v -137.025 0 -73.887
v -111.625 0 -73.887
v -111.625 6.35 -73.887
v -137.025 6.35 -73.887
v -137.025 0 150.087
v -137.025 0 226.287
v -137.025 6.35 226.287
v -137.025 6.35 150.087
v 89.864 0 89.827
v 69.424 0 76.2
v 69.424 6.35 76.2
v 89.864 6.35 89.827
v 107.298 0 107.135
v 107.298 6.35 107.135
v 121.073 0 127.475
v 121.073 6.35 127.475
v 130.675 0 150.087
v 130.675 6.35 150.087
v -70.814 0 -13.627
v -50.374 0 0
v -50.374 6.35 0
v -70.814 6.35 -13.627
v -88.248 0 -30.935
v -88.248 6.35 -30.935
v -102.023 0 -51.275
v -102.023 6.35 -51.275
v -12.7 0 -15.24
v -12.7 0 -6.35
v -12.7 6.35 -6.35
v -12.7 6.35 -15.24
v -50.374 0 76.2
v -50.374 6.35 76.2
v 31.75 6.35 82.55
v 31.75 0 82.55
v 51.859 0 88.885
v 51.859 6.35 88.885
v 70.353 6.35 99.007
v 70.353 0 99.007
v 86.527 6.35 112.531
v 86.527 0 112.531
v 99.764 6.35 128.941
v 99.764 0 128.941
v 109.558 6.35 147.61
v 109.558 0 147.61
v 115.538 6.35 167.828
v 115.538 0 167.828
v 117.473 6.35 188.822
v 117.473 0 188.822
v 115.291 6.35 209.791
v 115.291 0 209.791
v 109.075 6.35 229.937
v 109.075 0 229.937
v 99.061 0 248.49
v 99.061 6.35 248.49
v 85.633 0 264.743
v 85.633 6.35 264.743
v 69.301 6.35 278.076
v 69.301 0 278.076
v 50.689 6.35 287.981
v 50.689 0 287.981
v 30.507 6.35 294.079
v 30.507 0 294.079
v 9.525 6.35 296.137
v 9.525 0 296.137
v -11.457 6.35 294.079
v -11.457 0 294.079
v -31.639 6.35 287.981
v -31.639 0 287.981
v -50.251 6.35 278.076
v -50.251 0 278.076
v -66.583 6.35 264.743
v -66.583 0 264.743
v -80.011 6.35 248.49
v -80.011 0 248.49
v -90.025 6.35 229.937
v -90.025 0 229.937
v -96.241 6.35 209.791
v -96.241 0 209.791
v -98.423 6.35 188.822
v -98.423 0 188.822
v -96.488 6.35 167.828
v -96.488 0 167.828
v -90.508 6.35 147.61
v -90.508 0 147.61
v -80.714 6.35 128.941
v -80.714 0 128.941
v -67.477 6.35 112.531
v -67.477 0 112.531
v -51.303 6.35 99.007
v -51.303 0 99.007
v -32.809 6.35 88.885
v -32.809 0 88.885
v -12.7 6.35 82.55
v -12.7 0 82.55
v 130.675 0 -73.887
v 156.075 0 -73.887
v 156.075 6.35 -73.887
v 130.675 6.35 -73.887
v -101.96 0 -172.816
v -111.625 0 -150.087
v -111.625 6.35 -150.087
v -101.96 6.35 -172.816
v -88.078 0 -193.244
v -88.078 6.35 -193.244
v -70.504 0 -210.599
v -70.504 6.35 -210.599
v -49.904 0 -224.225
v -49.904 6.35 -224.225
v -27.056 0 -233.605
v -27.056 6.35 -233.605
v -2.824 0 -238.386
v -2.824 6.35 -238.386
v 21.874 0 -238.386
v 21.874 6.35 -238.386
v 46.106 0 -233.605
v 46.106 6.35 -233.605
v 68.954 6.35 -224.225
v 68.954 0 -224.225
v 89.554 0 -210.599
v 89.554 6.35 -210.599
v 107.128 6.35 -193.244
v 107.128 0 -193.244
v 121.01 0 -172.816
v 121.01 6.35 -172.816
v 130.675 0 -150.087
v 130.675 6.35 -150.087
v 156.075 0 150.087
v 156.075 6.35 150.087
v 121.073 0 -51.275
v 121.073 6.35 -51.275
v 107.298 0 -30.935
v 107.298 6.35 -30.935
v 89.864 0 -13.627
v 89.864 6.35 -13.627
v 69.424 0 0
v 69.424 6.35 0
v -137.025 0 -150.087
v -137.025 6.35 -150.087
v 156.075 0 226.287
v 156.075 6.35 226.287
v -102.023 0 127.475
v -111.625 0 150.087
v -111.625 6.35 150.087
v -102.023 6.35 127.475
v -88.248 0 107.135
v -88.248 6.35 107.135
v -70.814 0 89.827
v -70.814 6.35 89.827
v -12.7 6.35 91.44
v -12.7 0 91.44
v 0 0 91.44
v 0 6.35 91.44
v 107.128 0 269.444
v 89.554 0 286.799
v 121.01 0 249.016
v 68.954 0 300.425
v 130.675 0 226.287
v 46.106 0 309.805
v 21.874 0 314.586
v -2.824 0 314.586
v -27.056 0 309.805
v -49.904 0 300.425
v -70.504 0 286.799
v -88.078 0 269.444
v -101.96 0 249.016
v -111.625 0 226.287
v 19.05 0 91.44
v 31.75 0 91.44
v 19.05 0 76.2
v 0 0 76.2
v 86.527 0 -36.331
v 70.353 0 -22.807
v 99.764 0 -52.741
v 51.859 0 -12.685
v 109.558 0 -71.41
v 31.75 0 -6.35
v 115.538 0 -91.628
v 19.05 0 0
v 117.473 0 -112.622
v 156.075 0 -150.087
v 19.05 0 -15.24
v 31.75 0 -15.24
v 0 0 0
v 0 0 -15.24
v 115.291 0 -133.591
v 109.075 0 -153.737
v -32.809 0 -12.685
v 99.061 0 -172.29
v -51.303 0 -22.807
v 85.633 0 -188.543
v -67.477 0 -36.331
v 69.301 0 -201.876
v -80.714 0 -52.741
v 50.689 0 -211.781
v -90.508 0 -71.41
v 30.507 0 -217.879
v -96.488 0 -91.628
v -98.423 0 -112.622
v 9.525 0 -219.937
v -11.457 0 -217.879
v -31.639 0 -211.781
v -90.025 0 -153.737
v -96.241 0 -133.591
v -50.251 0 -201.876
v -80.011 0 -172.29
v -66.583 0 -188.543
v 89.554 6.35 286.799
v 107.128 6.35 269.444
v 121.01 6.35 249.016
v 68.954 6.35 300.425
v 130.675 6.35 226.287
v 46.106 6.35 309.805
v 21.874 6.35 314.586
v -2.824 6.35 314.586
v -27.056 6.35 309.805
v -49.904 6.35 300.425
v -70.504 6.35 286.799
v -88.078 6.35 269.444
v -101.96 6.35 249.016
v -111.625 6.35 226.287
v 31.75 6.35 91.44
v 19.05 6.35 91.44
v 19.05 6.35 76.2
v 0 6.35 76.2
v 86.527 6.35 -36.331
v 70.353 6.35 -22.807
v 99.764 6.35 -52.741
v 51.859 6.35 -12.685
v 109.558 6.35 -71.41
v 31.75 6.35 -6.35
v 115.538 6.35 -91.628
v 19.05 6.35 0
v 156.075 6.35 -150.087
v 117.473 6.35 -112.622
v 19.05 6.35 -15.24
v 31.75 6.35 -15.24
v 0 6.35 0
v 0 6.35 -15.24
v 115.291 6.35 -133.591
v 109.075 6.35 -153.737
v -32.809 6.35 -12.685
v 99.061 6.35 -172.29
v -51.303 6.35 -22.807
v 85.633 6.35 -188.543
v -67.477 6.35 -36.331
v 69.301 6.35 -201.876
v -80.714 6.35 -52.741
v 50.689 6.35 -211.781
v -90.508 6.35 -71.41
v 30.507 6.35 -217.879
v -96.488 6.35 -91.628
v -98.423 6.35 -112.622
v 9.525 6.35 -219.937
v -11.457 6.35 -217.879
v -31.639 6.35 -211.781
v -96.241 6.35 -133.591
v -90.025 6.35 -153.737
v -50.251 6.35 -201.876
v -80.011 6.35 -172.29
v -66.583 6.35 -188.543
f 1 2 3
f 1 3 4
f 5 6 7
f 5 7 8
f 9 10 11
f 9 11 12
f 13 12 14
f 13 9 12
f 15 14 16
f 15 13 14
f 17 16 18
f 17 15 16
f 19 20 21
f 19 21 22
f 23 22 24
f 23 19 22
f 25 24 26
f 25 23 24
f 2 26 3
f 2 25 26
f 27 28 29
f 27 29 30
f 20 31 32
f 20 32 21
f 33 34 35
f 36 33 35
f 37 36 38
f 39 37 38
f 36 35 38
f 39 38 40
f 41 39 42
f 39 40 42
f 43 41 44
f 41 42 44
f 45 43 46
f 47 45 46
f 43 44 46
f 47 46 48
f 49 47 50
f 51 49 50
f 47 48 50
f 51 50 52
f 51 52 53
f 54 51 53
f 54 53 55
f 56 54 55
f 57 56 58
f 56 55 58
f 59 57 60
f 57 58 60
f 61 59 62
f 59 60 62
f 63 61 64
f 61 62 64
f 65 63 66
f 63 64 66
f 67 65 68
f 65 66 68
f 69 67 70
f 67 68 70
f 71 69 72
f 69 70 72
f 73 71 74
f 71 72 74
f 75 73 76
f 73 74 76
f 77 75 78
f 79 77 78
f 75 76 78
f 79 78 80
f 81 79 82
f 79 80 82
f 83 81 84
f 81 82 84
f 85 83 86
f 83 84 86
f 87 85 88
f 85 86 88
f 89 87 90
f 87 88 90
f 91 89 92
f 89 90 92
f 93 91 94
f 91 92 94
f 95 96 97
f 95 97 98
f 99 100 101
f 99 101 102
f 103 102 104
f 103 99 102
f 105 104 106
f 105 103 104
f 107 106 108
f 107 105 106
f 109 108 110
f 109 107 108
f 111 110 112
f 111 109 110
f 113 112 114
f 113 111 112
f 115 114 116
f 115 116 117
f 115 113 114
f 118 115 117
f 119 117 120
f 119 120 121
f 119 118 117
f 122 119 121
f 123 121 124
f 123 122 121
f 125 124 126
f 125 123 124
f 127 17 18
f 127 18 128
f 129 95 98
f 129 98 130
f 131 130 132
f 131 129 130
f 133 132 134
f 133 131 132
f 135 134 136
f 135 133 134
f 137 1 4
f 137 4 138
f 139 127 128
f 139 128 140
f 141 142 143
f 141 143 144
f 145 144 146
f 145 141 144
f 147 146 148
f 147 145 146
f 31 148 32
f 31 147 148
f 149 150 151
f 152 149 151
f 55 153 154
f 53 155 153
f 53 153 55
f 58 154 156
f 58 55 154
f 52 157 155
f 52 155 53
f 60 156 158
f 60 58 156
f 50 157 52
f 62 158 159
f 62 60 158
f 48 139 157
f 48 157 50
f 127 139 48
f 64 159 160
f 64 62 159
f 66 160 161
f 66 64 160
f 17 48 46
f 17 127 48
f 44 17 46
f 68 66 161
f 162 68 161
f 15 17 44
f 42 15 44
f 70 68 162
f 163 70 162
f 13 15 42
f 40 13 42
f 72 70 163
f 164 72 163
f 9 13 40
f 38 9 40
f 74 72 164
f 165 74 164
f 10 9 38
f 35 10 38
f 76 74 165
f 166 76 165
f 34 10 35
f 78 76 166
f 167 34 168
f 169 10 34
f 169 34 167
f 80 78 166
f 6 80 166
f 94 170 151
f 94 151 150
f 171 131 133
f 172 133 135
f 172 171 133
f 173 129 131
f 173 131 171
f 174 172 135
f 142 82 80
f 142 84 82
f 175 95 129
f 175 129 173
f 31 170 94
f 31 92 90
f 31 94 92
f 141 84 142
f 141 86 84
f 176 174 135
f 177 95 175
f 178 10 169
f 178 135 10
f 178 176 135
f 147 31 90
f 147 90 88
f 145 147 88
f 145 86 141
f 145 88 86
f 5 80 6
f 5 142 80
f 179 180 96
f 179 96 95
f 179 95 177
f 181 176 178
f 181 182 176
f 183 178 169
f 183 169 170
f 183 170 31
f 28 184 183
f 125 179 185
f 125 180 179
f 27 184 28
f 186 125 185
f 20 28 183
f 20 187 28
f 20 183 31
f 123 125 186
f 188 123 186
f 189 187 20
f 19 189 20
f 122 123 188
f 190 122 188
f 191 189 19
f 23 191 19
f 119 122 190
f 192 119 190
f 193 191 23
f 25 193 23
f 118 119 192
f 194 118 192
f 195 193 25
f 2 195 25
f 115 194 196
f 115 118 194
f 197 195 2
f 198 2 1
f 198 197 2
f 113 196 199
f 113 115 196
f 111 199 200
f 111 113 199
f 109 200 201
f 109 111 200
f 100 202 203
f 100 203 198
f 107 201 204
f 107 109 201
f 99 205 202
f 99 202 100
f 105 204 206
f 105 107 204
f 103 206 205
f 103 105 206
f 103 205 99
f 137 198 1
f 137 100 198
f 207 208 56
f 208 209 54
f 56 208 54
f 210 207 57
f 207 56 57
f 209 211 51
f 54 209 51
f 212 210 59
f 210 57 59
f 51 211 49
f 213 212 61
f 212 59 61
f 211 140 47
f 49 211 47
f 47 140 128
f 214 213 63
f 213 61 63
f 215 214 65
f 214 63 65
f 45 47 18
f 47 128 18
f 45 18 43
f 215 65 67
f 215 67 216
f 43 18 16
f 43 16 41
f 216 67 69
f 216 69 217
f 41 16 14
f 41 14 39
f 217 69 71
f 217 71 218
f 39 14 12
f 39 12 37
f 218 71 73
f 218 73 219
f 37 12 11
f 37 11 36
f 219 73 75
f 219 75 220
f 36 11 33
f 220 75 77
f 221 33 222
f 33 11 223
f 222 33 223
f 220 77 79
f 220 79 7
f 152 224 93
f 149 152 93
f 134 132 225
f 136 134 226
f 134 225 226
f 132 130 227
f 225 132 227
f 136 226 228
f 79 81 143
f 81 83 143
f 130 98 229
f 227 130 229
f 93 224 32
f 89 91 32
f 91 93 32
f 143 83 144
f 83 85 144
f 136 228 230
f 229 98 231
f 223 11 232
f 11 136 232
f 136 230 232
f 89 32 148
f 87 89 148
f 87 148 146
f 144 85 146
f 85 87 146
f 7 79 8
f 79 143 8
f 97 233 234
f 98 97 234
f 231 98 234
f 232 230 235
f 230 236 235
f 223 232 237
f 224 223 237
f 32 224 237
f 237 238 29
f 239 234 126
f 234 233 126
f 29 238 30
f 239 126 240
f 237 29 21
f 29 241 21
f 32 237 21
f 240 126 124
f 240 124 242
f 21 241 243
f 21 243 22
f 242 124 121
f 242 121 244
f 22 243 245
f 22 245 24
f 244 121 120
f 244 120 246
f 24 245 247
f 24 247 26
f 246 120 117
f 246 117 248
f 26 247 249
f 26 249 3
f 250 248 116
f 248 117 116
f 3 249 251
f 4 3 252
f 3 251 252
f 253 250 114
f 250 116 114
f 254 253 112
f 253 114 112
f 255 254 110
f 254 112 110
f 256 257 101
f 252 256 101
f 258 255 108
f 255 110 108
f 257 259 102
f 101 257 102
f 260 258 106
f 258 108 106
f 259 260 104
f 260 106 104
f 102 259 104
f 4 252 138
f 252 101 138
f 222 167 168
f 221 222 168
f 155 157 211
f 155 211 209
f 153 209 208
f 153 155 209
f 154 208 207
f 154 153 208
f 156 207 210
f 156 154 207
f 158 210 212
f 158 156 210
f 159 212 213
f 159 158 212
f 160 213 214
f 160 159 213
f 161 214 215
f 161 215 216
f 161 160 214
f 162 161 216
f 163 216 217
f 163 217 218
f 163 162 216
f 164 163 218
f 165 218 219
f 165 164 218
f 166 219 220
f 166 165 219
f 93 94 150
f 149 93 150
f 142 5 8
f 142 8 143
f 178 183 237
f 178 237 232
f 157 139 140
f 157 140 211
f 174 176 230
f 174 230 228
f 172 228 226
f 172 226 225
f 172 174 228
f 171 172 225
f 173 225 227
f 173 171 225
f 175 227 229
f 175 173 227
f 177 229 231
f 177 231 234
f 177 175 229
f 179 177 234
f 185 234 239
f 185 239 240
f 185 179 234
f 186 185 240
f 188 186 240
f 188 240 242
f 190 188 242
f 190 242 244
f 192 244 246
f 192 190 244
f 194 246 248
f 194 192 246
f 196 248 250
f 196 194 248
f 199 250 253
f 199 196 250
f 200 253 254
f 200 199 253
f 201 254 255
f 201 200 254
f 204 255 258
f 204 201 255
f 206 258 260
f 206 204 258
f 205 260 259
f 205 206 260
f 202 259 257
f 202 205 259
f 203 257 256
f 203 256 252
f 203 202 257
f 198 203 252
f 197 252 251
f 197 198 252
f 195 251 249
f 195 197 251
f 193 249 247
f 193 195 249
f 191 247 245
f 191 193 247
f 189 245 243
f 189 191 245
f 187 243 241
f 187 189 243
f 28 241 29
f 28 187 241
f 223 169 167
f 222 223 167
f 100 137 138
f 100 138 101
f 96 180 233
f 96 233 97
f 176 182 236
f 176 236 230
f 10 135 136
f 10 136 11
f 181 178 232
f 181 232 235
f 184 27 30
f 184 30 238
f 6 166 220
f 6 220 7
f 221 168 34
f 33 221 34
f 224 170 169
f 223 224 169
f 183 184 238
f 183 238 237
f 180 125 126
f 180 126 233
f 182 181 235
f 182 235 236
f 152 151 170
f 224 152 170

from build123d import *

# Parameters (mm, degrees)
BOSS_EXTRUDE1_DEPTH = 6.35


with BuildPart() as part:
    # Sketch1 → Boss-Extrude1 (new body)
    with BuildSketch(Plane(origin=(0, 0, 0), x_dir=(1, 0, 0), z_dir=(0, 1, 0))):
        with BuildLine():
            Line((130.67527858, 150.087360224), (156.07527858, 150.087360224))
            Line((156.07527858, 150.087360224), (156.07527858, 73.887360224))
            Line((156.07527858, 73.887360224), (130.67527858, 73.887360224))
            ThreePointArc((130.67527858, 73.887360224), (107.297701698, 30.934915456), (69.423507078, 0))
            Line((69.423507078, 0), (69.423507078, -76.2))
            ThreePointArc((69.423507078, -76.2), (107.297701698, -107.134915456), (130.67527858, -150.087360224))
            Line((130.67527858, -150.087360224), (156.07527858, -150.087360224))
            Line((156.07527858, -150.087360224), (156.07527858, -226.287360224))
            Line((156.07527858, -226.287360224), (130.67527858, -226.287360224))
            ThreePointArc((130.67527858, -226.287360224), (9.525, -315.187360224), (-111.62527858, -226.287360224))
            Line((-111.62527858, -226.287360224), (-137.02527858, -226.287360224))
            Line((-137.02527858, -226.287360224), (-137.02527858, -150.087360224))
            Line((-137.02527858, -150.087360224), (-111.62527858, -150.087360224))
            ThreePointArc((-111.62527858, -150.087360224), (-88.247701698, -107.134915456), (-50.373507078, -76.2))
            Line((-50.373507078, -76.2), (-50.373507078, 0))
            ThreePointArc((-50.373507078, 0), (-88.247701698, 30.934915456), (-111.62527858, 73.887360224))
            Line((-111.62527858, 73.887360224), (-137.02527858, 73.887360224))
            Line((-137.02527858, 73.887360224), (-137.02527858, 150.087360224))
            Line((-137.02527858, 150.087360224), (-111.62527858, 150.087360224))
            ThreePointArc((-111.62527858, 150.087360224), (9.525, 238.987360224), (130.67527858, 150.087360224))
        make_face()
        with BuildLine():
            Line((0, 0), (19.05, 0))
            Line((19.05, 0), (19.05, 15.24))
            Line((19.05, 15.24), (31.75, 15.24))
            Line((31.75, 15.24), (31.75, 6.35))
            ThreePointArc((31.75, 6.35), (9.525, 219.937360224), (-12.7, 6.35))
            Line((-12.7, 6.35), (-12.7, 15.24))
            Line((-12.7, 15.24), (0, 15.24))
            Line((0, 15.24), (0, 0))
        make_face(mode=Mode.SUBTRACT)
        with BuildLine():
            Line((0, -76.2), (19.05, -76.2))
            Line((19.05, -76.2), (19.05, -91.44))
            Line((19.05, -91.44), (31.75, -91.44))
            Line((31.75, -91.44), (31.75, -82.55))
            ThreePointArc((31.75, -82.55), (9.525, -296.137360224), (-12.7, -82.55))
            Line((-12.7, -82.55), (-12.7, -91.44))
            Line((-12.7, -91.44), (0, -91.44))
            Line((0, -91.44), (0, -76.2))
        make_face(mode=Mode.SUBTRACT)
    extrude(amount=BOSS_EXTRUDE1_DEPTH)


solid = part.part
